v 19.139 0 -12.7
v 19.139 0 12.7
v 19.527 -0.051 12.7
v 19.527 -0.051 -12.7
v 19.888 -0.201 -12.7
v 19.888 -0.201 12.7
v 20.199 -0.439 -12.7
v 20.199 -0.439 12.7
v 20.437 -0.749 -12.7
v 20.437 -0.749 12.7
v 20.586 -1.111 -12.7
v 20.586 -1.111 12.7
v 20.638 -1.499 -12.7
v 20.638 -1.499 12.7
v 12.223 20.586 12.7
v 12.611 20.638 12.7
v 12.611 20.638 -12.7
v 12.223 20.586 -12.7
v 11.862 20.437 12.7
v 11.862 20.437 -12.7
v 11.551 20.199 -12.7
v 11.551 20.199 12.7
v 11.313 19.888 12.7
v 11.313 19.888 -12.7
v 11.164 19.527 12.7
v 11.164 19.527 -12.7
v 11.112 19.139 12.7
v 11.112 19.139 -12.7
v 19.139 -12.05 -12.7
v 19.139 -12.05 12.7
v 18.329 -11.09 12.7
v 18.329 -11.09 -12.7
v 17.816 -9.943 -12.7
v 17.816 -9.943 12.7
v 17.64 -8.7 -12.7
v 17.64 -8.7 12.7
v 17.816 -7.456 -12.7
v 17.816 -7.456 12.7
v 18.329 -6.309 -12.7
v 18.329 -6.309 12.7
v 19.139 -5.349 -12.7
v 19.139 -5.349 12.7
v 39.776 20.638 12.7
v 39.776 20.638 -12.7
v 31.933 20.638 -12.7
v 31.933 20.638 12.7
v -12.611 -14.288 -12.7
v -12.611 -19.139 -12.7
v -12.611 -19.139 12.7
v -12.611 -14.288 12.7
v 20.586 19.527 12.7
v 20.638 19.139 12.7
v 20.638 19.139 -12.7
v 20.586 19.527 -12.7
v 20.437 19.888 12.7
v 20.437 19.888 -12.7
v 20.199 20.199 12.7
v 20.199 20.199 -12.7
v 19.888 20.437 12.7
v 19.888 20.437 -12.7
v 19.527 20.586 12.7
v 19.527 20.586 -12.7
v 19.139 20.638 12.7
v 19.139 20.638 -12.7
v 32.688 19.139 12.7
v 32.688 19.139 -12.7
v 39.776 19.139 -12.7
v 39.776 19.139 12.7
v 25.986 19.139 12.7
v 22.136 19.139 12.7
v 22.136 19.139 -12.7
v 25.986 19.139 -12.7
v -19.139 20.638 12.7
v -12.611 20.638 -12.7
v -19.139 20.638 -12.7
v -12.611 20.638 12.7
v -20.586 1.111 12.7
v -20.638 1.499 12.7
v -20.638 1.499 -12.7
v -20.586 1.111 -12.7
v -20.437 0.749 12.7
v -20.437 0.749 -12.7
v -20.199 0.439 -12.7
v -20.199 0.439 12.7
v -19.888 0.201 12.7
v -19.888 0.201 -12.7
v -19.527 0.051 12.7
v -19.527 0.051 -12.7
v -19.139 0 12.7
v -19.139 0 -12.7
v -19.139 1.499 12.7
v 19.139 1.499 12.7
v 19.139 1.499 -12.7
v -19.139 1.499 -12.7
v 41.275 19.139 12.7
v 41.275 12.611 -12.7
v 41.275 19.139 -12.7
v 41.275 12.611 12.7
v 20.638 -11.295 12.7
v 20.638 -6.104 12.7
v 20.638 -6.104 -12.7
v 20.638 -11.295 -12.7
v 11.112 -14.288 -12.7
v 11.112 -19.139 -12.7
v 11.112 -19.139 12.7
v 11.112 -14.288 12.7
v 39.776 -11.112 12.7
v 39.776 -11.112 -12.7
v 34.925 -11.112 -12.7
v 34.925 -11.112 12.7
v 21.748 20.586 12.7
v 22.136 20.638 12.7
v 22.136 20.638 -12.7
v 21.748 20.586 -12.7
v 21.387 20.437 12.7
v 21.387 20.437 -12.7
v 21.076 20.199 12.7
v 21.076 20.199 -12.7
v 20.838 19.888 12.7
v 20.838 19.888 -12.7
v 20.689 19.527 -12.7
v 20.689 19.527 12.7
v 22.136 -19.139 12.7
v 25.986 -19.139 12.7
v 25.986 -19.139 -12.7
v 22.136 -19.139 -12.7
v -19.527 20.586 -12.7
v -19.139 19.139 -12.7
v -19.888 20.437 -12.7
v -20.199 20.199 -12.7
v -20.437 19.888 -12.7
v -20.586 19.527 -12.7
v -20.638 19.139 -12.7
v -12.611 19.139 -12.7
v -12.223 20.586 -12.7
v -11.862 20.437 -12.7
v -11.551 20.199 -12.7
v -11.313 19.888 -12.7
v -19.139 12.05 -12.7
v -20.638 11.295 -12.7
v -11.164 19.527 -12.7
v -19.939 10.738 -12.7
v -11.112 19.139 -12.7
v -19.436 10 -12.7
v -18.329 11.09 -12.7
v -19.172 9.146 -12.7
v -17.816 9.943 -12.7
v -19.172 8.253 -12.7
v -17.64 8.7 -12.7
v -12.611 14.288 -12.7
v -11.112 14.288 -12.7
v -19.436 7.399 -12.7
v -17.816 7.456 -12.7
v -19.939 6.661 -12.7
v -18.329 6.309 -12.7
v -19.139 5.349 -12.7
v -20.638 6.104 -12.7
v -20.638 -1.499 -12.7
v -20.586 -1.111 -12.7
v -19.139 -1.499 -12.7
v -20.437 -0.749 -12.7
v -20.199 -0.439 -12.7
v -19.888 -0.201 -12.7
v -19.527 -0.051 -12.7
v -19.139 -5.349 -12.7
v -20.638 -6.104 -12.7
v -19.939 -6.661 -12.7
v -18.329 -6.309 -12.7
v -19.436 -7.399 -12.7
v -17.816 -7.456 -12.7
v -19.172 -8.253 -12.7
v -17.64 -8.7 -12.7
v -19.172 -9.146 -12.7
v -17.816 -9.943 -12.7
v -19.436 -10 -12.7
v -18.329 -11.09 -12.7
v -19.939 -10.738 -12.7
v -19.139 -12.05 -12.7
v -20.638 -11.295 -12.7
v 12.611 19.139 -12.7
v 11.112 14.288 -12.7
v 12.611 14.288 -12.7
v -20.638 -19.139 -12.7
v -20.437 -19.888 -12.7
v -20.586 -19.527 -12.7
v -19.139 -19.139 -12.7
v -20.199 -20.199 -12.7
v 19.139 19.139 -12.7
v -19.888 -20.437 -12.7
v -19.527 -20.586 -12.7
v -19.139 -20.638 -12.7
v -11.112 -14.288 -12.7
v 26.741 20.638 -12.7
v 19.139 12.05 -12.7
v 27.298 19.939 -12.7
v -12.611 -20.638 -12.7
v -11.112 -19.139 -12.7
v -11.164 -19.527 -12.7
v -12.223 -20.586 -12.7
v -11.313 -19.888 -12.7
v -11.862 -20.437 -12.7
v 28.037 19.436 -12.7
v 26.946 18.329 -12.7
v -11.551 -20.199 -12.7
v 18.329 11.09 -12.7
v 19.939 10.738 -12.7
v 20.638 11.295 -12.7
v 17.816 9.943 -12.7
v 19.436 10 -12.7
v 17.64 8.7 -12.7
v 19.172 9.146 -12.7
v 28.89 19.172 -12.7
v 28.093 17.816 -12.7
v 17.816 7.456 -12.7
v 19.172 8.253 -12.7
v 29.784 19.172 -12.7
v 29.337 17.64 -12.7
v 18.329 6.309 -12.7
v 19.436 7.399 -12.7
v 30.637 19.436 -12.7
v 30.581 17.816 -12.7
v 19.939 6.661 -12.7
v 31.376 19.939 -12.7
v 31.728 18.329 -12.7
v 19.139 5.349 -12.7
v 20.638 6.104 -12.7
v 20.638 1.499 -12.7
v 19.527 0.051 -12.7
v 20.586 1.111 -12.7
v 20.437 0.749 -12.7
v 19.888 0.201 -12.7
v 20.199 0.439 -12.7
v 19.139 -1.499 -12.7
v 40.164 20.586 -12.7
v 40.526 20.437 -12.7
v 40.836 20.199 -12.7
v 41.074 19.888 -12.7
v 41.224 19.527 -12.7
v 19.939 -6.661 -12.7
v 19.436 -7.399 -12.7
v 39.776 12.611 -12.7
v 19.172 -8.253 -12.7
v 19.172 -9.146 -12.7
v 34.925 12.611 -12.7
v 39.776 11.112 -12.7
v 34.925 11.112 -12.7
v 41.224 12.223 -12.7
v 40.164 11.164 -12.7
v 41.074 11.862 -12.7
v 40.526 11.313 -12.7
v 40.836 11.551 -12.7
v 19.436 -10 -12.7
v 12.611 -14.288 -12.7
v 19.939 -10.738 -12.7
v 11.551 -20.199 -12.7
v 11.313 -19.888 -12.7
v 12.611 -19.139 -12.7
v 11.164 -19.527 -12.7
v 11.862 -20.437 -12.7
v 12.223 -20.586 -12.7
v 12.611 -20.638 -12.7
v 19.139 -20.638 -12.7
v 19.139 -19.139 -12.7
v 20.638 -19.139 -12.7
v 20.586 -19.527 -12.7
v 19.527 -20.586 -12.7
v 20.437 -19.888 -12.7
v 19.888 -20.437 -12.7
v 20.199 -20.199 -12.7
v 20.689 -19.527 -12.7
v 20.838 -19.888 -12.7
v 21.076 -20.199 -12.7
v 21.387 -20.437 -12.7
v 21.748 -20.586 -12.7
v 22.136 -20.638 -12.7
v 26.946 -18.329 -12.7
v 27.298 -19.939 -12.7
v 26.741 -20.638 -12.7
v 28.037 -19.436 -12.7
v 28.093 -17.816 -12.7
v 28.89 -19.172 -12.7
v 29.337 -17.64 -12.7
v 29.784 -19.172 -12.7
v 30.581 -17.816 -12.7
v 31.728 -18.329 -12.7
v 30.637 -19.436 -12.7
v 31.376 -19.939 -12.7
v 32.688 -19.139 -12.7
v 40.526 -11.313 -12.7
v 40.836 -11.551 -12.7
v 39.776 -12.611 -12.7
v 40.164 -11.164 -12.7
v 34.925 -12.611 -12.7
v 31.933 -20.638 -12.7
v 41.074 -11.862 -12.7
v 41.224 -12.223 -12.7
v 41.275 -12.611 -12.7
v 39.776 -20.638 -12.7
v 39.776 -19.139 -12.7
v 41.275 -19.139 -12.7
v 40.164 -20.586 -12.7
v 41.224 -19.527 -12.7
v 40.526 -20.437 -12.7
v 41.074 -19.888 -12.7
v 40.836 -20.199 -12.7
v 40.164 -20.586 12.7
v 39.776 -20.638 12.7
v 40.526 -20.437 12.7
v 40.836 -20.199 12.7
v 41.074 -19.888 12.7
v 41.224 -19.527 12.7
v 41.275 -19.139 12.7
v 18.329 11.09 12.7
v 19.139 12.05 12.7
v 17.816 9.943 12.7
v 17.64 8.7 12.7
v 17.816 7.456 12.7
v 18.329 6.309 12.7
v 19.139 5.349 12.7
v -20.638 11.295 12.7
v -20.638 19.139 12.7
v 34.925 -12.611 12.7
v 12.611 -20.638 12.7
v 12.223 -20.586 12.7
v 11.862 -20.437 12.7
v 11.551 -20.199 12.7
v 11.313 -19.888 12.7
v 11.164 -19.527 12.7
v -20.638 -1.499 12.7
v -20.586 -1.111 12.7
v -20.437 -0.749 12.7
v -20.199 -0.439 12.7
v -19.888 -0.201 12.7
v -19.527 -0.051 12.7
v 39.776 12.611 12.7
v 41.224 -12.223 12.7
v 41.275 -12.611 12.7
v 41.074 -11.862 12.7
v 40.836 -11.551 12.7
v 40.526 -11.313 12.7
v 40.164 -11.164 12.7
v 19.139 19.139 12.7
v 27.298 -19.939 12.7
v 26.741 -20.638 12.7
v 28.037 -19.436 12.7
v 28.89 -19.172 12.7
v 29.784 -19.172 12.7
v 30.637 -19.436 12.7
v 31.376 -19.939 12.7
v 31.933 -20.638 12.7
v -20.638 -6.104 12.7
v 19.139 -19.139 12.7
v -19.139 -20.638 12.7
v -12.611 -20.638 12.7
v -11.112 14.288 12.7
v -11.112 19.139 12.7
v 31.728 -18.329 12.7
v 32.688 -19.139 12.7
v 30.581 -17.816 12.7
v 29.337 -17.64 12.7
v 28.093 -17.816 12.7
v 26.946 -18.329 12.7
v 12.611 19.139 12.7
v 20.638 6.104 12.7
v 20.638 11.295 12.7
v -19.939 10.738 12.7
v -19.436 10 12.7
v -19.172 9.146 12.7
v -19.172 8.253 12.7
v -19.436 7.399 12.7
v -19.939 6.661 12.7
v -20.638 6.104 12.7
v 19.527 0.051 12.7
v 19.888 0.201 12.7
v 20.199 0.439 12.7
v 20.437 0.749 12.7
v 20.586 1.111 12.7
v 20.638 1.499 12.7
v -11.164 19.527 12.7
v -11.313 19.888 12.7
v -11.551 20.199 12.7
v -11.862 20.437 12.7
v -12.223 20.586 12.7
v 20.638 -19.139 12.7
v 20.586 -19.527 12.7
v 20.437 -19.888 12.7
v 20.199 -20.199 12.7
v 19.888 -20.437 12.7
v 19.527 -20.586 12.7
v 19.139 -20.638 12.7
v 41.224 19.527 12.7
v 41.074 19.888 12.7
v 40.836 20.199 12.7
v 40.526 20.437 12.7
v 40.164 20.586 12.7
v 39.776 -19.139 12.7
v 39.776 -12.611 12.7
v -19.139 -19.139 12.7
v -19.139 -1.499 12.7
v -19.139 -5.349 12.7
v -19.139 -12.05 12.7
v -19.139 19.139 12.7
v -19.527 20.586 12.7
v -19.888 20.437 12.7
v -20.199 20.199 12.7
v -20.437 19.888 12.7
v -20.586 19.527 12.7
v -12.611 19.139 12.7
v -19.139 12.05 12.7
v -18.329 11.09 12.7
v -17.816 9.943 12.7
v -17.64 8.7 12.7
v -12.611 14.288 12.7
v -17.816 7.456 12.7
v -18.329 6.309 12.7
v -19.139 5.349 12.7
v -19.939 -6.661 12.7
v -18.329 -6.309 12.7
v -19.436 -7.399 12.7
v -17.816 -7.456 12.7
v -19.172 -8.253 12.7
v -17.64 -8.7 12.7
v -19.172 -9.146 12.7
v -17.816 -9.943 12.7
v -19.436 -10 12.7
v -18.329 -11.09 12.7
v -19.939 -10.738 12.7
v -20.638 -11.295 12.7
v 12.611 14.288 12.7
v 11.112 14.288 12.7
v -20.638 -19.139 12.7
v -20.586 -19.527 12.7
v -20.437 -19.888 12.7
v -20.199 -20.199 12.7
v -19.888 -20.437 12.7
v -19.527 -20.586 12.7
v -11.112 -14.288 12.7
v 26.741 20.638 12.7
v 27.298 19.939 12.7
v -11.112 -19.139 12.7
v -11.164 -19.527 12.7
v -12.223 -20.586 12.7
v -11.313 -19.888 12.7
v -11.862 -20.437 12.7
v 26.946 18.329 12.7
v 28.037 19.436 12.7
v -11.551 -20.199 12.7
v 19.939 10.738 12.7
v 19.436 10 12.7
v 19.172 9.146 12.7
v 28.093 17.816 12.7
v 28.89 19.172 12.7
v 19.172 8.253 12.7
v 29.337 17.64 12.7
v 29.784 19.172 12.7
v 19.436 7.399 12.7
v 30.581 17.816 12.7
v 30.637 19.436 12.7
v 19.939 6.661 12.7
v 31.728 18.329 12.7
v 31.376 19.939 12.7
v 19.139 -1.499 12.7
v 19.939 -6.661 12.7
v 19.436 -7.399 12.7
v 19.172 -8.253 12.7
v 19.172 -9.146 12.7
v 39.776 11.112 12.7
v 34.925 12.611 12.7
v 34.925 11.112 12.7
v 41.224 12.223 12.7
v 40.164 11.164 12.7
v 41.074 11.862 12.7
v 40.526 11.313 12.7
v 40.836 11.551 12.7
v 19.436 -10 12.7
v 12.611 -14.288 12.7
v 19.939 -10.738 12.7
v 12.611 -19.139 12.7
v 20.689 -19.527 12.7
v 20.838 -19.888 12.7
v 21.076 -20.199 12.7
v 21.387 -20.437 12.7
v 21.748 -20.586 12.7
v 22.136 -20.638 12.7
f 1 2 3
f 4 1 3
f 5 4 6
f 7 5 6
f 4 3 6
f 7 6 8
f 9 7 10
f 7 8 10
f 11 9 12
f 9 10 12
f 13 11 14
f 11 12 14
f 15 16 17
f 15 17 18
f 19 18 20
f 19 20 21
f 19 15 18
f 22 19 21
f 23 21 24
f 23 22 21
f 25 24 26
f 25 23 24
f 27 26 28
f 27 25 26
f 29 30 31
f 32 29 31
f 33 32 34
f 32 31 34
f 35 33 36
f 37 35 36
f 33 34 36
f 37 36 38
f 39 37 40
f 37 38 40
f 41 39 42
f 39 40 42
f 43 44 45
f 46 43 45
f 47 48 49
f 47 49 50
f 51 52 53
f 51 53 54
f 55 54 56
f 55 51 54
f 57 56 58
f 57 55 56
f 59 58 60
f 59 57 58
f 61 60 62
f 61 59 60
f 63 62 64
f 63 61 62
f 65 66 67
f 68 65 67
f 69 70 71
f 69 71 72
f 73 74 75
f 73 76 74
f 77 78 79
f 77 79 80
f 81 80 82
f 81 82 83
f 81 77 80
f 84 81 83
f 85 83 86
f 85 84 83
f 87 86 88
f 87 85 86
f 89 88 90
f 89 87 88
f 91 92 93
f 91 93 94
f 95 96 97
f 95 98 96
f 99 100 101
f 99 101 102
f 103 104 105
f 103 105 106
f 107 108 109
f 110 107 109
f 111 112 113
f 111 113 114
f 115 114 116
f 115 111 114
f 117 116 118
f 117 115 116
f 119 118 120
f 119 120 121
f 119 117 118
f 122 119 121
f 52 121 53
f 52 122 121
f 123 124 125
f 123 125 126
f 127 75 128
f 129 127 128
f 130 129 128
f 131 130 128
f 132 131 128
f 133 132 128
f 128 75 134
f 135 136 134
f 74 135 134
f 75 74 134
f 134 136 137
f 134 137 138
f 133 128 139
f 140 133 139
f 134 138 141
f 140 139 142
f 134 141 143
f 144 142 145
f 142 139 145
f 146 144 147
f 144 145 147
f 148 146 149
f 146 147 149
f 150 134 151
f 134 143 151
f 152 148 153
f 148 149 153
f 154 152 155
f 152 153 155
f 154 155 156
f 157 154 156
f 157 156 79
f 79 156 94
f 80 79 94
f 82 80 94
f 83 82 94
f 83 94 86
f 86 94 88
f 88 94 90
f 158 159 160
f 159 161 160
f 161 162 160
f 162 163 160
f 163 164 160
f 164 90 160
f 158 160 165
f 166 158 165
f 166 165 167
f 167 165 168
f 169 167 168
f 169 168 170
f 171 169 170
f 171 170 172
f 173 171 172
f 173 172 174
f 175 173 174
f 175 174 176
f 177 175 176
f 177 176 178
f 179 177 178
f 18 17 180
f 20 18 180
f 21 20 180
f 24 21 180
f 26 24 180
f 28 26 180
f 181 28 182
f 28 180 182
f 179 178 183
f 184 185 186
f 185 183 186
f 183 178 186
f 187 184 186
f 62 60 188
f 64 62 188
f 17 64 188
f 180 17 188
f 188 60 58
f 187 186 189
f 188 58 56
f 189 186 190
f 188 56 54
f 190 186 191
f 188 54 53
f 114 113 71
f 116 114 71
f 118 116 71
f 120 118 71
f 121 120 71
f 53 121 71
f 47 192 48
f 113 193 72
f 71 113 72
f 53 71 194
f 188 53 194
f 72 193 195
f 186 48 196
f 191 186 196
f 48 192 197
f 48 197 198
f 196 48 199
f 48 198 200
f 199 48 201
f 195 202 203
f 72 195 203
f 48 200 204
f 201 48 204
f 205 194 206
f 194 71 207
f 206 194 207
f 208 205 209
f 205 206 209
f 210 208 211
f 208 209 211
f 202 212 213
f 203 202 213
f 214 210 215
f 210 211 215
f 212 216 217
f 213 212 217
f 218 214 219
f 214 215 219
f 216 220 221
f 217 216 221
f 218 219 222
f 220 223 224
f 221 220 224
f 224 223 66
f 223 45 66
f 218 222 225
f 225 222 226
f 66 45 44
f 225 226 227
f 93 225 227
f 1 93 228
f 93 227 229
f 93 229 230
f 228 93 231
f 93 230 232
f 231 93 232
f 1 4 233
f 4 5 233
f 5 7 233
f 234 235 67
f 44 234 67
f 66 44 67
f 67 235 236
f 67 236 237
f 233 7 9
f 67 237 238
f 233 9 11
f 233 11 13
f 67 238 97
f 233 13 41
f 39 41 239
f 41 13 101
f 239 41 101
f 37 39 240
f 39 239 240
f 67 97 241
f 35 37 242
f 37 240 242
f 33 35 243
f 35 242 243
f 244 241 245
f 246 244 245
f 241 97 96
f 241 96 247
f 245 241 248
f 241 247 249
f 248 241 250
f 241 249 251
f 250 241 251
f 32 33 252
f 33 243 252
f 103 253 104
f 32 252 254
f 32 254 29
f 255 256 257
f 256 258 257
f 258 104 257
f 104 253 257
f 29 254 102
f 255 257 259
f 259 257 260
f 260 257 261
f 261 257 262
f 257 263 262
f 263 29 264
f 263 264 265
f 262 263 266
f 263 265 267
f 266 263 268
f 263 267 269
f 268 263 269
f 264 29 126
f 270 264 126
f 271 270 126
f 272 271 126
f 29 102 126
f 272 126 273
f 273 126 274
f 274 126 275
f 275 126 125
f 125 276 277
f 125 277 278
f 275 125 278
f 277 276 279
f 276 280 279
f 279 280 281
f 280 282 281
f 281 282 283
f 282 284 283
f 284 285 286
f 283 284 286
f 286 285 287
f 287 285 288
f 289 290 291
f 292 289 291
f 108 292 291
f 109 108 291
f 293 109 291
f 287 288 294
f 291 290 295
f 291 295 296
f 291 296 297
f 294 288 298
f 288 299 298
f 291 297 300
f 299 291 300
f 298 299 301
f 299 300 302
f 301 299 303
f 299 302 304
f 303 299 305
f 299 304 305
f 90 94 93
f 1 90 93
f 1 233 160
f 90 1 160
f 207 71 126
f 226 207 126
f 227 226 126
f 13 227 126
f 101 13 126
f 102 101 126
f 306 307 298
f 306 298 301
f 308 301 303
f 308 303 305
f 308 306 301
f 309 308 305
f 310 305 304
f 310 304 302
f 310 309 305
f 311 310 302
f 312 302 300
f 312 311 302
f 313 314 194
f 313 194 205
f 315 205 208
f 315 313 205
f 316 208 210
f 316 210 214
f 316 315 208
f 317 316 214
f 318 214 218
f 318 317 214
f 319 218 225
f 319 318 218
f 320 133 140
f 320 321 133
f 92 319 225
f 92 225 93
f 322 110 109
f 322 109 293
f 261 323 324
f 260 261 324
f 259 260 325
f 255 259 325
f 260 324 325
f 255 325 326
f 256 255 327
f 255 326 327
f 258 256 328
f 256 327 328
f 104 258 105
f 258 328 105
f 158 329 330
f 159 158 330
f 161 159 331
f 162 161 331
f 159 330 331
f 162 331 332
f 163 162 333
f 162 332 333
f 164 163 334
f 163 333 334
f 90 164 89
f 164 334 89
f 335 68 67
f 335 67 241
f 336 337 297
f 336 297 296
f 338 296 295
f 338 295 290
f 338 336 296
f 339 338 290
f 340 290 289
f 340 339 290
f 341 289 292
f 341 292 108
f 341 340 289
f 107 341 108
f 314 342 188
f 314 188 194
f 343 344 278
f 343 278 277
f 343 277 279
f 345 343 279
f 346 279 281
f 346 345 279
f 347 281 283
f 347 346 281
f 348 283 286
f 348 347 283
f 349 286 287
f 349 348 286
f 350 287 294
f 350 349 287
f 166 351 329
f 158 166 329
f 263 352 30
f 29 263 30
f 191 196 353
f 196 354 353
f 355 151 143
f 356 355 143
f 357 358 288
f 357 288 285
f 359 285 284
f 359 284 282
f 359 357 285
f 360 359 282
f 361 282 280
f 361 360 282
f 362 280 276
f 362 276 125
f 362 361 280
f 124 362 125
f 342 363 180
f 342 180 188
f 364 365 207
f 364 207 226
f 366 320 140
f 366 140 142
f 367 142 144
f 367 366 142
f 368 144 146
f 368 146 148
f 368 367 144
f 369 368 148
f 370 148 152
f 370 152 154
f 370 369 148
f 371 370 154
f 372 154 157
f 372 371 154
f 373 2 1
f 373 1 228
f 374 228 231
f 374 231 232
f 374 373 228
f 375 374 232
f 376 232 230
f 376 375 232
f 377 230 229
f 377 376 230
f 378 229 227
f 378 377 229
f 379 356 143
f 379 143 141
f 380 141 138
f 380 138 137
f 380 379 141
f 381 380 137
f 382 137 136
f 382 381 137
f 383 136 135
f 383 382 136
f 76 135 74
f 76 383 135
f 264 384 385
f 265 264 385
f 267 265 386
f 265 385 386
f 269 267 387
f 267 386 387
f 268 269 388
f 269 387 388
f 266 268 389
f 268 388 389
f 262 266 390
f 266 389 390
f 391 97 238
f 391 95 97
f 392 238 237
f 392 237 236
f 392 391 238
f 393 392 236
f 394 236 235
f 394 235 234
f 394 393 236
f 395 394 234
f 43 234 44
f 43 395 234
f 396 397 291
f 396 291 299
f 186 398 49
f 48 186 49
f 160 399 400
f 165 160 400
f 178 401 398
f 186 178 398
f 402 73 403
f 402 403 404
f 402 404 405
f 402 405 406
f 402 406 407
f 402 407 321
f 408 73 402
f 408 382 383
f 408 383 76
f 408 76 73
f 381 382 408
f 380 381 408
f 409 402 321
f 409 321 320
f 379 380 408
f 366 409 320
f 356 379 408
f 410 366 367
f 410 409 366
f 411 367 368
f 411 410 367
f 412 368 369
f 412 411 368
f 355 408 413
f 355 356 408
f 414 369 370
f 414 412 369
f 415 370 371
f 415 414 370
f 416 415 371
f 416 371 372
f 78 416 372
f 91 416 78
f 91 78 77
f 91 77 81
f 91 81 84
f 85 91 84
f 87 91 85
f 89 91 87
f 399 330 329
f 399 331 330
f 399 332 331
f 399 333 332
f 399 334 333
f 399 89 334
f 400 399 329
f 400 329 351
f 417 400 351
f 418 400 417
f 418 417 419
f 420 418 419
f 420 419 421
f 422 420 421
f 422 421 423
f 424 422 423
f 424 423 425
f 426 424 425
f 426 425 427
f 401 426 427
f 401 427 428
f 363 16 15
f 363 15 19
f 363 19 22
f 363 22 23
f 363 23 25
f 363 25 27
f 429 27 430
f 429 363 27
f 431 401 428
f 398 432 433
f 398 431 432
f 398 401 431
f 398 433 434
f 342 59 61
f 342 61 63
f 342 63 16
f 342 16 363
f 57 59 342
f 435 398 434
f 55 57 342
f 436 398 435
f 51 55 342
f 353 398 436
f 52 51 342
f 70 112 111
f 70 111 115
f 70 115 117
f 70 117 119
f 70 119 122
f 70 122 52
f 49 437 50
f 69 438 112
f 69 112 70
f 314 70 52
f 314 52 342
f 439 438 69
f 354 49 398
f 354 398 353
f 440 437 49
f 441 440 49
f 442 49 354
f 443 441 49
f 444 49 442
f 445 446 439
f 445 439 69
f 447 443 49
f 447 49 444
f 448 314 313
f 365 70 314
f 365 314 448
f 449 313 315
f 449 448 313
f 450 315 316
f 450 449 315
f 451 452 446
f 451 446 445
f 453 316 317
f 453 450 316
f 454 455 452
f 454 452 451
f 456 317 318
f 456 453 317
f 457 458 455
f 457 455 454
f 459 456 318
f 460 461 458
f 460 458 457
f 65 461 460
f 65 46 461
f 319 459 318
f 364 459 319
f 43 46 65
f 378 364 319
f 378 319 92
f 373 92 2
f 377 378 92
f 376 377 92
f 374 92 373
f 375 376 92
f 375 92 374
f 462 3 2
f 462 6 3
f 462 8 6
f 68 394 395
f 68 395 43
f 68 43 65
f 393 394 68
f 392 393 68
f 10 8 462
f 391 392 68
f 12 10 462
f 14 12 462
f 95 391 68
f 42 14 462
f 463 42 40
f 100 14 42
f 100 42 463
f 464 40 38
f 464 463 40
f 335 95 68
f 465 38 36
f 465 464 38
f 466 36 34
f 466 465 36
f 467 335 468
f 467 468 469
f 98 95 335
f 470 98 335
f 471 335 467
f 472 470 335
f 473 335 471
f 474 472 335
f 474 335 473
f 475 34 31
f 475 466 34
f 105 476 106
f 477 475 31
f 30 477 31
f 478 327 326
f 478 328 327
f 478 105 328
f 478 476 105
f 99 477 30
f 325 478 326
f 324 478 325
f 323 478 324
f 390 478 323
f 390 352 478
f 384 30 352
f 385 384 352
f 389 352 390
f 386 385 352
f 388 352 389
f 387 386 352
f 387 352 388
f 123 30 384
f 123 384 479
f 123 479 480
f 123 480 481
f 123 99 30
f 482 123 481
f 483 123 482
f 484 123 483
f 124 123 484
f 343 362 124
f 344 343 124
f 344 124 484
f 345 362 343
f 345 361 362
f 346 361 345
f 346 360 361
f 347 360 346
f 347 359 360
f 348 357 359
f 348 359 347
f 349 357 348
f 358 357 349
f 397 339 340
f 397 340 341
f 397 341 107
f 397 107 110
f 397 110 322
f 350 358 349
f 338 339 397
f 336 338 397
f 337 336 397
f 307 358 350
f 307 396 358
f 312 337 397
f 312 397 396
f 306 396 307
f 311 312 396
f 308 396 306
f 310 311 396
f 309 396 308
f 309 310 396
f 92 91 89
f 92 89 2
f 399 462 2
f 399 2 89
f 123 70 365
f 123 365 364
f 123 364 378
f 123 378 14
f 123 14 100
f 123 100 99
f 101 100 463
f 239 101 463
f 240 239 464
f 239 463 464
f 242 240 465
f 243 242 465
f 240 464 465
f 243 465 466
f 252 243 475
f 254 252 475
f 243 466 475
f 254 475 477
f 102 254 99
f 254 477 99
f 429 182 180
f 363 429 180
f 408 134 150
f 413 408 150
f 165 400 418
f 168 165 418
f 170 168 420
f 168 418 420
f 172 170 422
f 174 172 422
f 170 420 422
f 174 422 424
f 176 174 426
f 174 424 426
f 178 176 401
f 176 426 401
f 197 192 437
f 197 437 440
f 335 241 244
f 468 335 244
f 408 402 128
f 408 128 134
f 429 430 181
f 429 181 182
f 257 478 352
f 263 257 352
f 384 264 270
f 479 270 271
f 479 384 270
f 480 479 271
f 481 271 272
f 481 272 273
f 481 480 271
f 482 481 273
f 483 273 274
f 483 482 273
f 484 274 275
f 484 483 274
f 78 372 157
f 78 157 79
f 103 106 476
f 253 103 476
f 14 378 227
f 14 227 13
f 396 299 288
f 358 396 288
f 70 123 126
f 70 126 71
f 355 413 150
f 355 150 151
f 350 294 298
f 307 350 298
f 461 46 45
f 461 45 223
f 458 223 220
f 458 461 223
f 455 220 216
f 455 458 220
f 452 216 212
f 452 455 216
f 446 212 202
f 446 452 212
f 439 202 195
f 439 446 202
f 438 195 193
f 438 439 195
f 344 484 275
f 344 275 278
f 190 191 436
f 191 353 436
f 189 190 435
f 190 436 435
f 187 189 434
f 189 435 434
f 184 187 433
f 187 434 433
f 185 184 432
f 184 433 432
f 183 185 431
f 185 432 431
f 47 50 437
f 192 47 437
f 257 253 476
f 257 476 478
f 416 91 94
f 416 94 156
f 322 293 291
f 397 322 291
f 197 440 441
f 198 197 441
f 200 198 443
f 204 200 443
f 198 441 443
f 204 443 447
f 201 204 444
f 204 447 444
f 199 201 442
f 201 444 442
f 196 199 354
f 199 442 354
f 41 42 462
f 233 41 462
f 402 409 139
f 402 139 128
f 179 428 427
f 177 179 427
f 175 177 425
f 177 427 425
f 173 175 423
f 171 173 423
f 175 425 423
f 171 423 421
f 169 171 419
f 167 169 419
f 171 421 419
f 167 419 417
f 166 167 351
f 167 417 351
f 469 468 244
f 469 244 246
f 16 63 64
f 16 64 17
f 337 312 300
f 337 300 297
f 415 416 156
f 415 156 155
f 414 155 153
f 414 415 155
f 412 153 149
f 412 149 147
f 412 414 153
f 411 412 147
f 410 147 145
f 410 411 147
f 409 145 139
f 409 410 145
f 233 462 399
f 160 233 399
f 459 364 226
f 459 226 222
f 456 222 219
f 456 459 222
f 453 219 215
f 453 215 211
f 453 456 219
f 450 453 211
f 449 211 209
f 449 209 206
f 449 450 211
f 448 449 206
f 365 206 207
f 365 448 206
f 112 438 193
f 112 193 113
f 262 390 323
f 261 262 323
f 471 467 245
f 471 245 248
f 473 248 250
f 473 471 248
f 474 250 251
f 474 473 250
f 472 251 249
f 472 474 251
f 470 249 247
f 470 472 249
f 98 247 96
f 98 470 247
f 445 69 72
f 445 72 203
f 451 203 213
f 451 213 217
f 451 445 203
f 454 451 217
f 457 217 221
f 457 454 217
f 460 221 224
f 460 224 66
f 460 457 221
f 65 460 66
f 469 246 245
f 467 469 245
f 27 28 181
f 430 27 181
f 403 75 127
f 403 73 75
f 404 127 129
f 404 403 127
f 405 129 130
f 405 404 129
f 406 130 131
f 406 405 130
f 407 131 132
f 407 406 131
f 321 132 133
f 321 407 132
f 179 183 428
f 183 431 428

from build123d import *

# Parameters (mm, degrees)
BASE_EXTRUDE_DEPTH  = 12.7
BOSS_EXTRUDE1_DEPTH = 12.7


with BuildPart() as part:
    # Sketch1 → Base-Extrude (new, symmetric)
    with BuildSketch(Plane.XY):
        with BuildLine():
            Line((-20.6375, 19.1389), (-20.6375, 11.29515134))
            ThreePointArc((-20.6375, 11.29515134), (-19.1389, 8.6995), (-20.6375, 6.10384866))
            Line((-20.6375, 6.10384866), (-20.6375, 1.4986))
            ThreePointArc((-20.6375, 1.4986), (-20.198570222, 0.438929778), (-19.1389, 0))
            Line((-19.1389, 0), (19.1389, 0))
            ThreePointArc((19.1389, 0), (20.198570222, 0.438929778), (20.6375, 1.4986))
            Line((20.6375, 1.4986), (20.6375, 6.10384866))
            ThreePointArc((20.6375, 6.10384866), (19.1389, 8.6995), (20.6375, 11.29515134))
            Line((20.6375, 11.29515134), (20.6375, 19.1389))
            ThreePointArc((20.6375, 19.1389), (20.198570222, 20.198570222), (19.1389, 20.6375))
            Line((19.1389, 20.6375), (12.6111, 20.6375))
            ThreePointArc((12.6111, 20.6375), (11.551429778, 20.198570222), (11.1125, 19.1389))
            Line((11.1125, 19.1389), (11.1125, 14.2875))
            Line((11.1125, 14.2875), (12.6111, 14.2875))
            Line((12.6111, 14.2875), (12.6111, 19.1389))
            Line((12.6111, 19.1389), (19.1389, 19.1389))
            Line((19.1389, 19.1389), (19.1389, 12.050471471))
            ThreePointArc((19.1389, 12.050471471), (17.6403, 8.6995), (19.1389, 5.348528529))
            Line((19.1389, 5.348528529), (19.1389, 1.4986))
            Line((19.1389, 1.4986), (-19.1389, 1.4986))
            Line((-19.1389, 1.4986), (-19.1389, 5.348528529))
            ThreePointArc((-19.1389, 5.348528529), (-17.6403, 8.6995), (-19.1389, 12.050471471))
            Line((-19.1389, 12.050471471), (-19.1389, 19.1389))
            Line((-19.1389, 19.1389), (-12.6111, 19.1389))
            Line((-12.6111, 19.1389), (-12.6111, 14.2875))
            Line((-12.6111, 14.2875), (-11.1125, 14.2875))
            Line((-11.1125, 14.2875), (-11.1125, 19.1389))
            ThreePointArc((-11.1125, 19.1389), (-11.551429778, 20.198570222), (-12.6111, 20.6375))
            Line((-12.6111, 20.6375), (-19.1389, 20.6375))
            ThreePointArc((-19.1389, 20.6375), (-20.198570222, 20.198570222), (-20.6375, 19.1389))
        make_face()
    base_extrude = extrude(amount=BASE_EXTRUDE_DEPTH, both=True)

    # Mirror1: Base-Extrude across plane
    add(base_extrude.mirror(Plane.ZX))

    # Sketch2 → Boss-Extrude1 (add, symmetric)
    with BuildSketch(Plane(origin=(20.16125, 0.15875, 0), x_dir=(0, -1, 0), z_dir=(0, 0, 1))):
        with BuildLine():
            Line((-20.47875, 19.61515), (-20.47875, 11.77140134))
            ThreePointArc((-20.47875, 11.77140134), (-18.98015, 9.17575), (-20.47875, 6.58009866))
            Line((-20.47875, 6.58009866), (-20.47875, 1.97485))
            ThreePointArc((-20.47875, 1.97485), (-20.039820222, 0.915179778), (-18.98015, 0.47625))
            Line((-18.98015, 0.47625), (19.29765, 0.47625))
            ThreePointArc((19.29765, 0.47625), (20.357320222, 0.915179778), (20.79625, 1.97485))
            Line((20.79625, 1.97485), (20.79625, 6.58009866))
            ThreePointArc((20.79625, 6.58009866), (19.29765, 9.17575), (20.79625, 11.77140134))
            Line((20.79625, 11.77140134), (20.79625, 19.61515))
            ThreePointArc((20.79625, 19.61515), (20.357320222, 20.674820222), (19.29765, 21.11375))
            Line((19.29765, 21.11375), (12.76985, 21.11375))
            ThreePointArc((12.76985, 21.11375), (11.710179778, 20.674820222), (11.27125, 19.61515))
            Line((11.27125, 19.61515), (11.27125, 14.76375))
            Line((11.27125, 14.76375), (12.76985, 14.76375))
            Line((12.76985, 14.76375), (12.76985, 19.61515))
            Line((12.76985, 19.61515), (19.29765, 19.61515))
            Line((19.29765, 19.61515), (19.29765, 12.526721471))
            ThreePointArc((19.29765, 12.526721471), (17.79905, 9.17575), (19.29765, 5.824778529))
            Line((19.29765, 5.824778529), (19.29765, 1.97485))
            Line((19.29765, 1.97485), (-18.98015, 1.97485))
            Line((-18.98015, 1.97485), (-18.98015, 5.824778529))
            ThreePointArc((-18.98015, 5.824778529), (-17.48155, 9.17575), (-18.98015, 12.526721471))
            Line((-18.98015, 12.526721471), (-18.98015, 19.61515))
            Line((-18.98015, 19.61515), (-12.45235, 19.61515))
            Line((-12.45235, 19.61515), (-12.45235, 14.76375))
            Line((-12.45235, 14.76375), (-10.95375, 14.76375))
            Line((-10.95375, 14.76375), (-10.95375, 19.61515))
            ThreePointArc((-10.95375, 19.61515), (-11.392679778, 20.674820222), (-12.45235, 21.11375))
            Line((-12.45235, 21.11375), (-18.98015, 21.11375))
            ThreePointArc((-18.98015, 21.11375), (-20.039820222, 20.674820222), (-20.47875, 19.61515))
        make_face()
    extrude(amount=BOSS_EXTRUDE1_DEPTH, both=True)


solid = part.part
